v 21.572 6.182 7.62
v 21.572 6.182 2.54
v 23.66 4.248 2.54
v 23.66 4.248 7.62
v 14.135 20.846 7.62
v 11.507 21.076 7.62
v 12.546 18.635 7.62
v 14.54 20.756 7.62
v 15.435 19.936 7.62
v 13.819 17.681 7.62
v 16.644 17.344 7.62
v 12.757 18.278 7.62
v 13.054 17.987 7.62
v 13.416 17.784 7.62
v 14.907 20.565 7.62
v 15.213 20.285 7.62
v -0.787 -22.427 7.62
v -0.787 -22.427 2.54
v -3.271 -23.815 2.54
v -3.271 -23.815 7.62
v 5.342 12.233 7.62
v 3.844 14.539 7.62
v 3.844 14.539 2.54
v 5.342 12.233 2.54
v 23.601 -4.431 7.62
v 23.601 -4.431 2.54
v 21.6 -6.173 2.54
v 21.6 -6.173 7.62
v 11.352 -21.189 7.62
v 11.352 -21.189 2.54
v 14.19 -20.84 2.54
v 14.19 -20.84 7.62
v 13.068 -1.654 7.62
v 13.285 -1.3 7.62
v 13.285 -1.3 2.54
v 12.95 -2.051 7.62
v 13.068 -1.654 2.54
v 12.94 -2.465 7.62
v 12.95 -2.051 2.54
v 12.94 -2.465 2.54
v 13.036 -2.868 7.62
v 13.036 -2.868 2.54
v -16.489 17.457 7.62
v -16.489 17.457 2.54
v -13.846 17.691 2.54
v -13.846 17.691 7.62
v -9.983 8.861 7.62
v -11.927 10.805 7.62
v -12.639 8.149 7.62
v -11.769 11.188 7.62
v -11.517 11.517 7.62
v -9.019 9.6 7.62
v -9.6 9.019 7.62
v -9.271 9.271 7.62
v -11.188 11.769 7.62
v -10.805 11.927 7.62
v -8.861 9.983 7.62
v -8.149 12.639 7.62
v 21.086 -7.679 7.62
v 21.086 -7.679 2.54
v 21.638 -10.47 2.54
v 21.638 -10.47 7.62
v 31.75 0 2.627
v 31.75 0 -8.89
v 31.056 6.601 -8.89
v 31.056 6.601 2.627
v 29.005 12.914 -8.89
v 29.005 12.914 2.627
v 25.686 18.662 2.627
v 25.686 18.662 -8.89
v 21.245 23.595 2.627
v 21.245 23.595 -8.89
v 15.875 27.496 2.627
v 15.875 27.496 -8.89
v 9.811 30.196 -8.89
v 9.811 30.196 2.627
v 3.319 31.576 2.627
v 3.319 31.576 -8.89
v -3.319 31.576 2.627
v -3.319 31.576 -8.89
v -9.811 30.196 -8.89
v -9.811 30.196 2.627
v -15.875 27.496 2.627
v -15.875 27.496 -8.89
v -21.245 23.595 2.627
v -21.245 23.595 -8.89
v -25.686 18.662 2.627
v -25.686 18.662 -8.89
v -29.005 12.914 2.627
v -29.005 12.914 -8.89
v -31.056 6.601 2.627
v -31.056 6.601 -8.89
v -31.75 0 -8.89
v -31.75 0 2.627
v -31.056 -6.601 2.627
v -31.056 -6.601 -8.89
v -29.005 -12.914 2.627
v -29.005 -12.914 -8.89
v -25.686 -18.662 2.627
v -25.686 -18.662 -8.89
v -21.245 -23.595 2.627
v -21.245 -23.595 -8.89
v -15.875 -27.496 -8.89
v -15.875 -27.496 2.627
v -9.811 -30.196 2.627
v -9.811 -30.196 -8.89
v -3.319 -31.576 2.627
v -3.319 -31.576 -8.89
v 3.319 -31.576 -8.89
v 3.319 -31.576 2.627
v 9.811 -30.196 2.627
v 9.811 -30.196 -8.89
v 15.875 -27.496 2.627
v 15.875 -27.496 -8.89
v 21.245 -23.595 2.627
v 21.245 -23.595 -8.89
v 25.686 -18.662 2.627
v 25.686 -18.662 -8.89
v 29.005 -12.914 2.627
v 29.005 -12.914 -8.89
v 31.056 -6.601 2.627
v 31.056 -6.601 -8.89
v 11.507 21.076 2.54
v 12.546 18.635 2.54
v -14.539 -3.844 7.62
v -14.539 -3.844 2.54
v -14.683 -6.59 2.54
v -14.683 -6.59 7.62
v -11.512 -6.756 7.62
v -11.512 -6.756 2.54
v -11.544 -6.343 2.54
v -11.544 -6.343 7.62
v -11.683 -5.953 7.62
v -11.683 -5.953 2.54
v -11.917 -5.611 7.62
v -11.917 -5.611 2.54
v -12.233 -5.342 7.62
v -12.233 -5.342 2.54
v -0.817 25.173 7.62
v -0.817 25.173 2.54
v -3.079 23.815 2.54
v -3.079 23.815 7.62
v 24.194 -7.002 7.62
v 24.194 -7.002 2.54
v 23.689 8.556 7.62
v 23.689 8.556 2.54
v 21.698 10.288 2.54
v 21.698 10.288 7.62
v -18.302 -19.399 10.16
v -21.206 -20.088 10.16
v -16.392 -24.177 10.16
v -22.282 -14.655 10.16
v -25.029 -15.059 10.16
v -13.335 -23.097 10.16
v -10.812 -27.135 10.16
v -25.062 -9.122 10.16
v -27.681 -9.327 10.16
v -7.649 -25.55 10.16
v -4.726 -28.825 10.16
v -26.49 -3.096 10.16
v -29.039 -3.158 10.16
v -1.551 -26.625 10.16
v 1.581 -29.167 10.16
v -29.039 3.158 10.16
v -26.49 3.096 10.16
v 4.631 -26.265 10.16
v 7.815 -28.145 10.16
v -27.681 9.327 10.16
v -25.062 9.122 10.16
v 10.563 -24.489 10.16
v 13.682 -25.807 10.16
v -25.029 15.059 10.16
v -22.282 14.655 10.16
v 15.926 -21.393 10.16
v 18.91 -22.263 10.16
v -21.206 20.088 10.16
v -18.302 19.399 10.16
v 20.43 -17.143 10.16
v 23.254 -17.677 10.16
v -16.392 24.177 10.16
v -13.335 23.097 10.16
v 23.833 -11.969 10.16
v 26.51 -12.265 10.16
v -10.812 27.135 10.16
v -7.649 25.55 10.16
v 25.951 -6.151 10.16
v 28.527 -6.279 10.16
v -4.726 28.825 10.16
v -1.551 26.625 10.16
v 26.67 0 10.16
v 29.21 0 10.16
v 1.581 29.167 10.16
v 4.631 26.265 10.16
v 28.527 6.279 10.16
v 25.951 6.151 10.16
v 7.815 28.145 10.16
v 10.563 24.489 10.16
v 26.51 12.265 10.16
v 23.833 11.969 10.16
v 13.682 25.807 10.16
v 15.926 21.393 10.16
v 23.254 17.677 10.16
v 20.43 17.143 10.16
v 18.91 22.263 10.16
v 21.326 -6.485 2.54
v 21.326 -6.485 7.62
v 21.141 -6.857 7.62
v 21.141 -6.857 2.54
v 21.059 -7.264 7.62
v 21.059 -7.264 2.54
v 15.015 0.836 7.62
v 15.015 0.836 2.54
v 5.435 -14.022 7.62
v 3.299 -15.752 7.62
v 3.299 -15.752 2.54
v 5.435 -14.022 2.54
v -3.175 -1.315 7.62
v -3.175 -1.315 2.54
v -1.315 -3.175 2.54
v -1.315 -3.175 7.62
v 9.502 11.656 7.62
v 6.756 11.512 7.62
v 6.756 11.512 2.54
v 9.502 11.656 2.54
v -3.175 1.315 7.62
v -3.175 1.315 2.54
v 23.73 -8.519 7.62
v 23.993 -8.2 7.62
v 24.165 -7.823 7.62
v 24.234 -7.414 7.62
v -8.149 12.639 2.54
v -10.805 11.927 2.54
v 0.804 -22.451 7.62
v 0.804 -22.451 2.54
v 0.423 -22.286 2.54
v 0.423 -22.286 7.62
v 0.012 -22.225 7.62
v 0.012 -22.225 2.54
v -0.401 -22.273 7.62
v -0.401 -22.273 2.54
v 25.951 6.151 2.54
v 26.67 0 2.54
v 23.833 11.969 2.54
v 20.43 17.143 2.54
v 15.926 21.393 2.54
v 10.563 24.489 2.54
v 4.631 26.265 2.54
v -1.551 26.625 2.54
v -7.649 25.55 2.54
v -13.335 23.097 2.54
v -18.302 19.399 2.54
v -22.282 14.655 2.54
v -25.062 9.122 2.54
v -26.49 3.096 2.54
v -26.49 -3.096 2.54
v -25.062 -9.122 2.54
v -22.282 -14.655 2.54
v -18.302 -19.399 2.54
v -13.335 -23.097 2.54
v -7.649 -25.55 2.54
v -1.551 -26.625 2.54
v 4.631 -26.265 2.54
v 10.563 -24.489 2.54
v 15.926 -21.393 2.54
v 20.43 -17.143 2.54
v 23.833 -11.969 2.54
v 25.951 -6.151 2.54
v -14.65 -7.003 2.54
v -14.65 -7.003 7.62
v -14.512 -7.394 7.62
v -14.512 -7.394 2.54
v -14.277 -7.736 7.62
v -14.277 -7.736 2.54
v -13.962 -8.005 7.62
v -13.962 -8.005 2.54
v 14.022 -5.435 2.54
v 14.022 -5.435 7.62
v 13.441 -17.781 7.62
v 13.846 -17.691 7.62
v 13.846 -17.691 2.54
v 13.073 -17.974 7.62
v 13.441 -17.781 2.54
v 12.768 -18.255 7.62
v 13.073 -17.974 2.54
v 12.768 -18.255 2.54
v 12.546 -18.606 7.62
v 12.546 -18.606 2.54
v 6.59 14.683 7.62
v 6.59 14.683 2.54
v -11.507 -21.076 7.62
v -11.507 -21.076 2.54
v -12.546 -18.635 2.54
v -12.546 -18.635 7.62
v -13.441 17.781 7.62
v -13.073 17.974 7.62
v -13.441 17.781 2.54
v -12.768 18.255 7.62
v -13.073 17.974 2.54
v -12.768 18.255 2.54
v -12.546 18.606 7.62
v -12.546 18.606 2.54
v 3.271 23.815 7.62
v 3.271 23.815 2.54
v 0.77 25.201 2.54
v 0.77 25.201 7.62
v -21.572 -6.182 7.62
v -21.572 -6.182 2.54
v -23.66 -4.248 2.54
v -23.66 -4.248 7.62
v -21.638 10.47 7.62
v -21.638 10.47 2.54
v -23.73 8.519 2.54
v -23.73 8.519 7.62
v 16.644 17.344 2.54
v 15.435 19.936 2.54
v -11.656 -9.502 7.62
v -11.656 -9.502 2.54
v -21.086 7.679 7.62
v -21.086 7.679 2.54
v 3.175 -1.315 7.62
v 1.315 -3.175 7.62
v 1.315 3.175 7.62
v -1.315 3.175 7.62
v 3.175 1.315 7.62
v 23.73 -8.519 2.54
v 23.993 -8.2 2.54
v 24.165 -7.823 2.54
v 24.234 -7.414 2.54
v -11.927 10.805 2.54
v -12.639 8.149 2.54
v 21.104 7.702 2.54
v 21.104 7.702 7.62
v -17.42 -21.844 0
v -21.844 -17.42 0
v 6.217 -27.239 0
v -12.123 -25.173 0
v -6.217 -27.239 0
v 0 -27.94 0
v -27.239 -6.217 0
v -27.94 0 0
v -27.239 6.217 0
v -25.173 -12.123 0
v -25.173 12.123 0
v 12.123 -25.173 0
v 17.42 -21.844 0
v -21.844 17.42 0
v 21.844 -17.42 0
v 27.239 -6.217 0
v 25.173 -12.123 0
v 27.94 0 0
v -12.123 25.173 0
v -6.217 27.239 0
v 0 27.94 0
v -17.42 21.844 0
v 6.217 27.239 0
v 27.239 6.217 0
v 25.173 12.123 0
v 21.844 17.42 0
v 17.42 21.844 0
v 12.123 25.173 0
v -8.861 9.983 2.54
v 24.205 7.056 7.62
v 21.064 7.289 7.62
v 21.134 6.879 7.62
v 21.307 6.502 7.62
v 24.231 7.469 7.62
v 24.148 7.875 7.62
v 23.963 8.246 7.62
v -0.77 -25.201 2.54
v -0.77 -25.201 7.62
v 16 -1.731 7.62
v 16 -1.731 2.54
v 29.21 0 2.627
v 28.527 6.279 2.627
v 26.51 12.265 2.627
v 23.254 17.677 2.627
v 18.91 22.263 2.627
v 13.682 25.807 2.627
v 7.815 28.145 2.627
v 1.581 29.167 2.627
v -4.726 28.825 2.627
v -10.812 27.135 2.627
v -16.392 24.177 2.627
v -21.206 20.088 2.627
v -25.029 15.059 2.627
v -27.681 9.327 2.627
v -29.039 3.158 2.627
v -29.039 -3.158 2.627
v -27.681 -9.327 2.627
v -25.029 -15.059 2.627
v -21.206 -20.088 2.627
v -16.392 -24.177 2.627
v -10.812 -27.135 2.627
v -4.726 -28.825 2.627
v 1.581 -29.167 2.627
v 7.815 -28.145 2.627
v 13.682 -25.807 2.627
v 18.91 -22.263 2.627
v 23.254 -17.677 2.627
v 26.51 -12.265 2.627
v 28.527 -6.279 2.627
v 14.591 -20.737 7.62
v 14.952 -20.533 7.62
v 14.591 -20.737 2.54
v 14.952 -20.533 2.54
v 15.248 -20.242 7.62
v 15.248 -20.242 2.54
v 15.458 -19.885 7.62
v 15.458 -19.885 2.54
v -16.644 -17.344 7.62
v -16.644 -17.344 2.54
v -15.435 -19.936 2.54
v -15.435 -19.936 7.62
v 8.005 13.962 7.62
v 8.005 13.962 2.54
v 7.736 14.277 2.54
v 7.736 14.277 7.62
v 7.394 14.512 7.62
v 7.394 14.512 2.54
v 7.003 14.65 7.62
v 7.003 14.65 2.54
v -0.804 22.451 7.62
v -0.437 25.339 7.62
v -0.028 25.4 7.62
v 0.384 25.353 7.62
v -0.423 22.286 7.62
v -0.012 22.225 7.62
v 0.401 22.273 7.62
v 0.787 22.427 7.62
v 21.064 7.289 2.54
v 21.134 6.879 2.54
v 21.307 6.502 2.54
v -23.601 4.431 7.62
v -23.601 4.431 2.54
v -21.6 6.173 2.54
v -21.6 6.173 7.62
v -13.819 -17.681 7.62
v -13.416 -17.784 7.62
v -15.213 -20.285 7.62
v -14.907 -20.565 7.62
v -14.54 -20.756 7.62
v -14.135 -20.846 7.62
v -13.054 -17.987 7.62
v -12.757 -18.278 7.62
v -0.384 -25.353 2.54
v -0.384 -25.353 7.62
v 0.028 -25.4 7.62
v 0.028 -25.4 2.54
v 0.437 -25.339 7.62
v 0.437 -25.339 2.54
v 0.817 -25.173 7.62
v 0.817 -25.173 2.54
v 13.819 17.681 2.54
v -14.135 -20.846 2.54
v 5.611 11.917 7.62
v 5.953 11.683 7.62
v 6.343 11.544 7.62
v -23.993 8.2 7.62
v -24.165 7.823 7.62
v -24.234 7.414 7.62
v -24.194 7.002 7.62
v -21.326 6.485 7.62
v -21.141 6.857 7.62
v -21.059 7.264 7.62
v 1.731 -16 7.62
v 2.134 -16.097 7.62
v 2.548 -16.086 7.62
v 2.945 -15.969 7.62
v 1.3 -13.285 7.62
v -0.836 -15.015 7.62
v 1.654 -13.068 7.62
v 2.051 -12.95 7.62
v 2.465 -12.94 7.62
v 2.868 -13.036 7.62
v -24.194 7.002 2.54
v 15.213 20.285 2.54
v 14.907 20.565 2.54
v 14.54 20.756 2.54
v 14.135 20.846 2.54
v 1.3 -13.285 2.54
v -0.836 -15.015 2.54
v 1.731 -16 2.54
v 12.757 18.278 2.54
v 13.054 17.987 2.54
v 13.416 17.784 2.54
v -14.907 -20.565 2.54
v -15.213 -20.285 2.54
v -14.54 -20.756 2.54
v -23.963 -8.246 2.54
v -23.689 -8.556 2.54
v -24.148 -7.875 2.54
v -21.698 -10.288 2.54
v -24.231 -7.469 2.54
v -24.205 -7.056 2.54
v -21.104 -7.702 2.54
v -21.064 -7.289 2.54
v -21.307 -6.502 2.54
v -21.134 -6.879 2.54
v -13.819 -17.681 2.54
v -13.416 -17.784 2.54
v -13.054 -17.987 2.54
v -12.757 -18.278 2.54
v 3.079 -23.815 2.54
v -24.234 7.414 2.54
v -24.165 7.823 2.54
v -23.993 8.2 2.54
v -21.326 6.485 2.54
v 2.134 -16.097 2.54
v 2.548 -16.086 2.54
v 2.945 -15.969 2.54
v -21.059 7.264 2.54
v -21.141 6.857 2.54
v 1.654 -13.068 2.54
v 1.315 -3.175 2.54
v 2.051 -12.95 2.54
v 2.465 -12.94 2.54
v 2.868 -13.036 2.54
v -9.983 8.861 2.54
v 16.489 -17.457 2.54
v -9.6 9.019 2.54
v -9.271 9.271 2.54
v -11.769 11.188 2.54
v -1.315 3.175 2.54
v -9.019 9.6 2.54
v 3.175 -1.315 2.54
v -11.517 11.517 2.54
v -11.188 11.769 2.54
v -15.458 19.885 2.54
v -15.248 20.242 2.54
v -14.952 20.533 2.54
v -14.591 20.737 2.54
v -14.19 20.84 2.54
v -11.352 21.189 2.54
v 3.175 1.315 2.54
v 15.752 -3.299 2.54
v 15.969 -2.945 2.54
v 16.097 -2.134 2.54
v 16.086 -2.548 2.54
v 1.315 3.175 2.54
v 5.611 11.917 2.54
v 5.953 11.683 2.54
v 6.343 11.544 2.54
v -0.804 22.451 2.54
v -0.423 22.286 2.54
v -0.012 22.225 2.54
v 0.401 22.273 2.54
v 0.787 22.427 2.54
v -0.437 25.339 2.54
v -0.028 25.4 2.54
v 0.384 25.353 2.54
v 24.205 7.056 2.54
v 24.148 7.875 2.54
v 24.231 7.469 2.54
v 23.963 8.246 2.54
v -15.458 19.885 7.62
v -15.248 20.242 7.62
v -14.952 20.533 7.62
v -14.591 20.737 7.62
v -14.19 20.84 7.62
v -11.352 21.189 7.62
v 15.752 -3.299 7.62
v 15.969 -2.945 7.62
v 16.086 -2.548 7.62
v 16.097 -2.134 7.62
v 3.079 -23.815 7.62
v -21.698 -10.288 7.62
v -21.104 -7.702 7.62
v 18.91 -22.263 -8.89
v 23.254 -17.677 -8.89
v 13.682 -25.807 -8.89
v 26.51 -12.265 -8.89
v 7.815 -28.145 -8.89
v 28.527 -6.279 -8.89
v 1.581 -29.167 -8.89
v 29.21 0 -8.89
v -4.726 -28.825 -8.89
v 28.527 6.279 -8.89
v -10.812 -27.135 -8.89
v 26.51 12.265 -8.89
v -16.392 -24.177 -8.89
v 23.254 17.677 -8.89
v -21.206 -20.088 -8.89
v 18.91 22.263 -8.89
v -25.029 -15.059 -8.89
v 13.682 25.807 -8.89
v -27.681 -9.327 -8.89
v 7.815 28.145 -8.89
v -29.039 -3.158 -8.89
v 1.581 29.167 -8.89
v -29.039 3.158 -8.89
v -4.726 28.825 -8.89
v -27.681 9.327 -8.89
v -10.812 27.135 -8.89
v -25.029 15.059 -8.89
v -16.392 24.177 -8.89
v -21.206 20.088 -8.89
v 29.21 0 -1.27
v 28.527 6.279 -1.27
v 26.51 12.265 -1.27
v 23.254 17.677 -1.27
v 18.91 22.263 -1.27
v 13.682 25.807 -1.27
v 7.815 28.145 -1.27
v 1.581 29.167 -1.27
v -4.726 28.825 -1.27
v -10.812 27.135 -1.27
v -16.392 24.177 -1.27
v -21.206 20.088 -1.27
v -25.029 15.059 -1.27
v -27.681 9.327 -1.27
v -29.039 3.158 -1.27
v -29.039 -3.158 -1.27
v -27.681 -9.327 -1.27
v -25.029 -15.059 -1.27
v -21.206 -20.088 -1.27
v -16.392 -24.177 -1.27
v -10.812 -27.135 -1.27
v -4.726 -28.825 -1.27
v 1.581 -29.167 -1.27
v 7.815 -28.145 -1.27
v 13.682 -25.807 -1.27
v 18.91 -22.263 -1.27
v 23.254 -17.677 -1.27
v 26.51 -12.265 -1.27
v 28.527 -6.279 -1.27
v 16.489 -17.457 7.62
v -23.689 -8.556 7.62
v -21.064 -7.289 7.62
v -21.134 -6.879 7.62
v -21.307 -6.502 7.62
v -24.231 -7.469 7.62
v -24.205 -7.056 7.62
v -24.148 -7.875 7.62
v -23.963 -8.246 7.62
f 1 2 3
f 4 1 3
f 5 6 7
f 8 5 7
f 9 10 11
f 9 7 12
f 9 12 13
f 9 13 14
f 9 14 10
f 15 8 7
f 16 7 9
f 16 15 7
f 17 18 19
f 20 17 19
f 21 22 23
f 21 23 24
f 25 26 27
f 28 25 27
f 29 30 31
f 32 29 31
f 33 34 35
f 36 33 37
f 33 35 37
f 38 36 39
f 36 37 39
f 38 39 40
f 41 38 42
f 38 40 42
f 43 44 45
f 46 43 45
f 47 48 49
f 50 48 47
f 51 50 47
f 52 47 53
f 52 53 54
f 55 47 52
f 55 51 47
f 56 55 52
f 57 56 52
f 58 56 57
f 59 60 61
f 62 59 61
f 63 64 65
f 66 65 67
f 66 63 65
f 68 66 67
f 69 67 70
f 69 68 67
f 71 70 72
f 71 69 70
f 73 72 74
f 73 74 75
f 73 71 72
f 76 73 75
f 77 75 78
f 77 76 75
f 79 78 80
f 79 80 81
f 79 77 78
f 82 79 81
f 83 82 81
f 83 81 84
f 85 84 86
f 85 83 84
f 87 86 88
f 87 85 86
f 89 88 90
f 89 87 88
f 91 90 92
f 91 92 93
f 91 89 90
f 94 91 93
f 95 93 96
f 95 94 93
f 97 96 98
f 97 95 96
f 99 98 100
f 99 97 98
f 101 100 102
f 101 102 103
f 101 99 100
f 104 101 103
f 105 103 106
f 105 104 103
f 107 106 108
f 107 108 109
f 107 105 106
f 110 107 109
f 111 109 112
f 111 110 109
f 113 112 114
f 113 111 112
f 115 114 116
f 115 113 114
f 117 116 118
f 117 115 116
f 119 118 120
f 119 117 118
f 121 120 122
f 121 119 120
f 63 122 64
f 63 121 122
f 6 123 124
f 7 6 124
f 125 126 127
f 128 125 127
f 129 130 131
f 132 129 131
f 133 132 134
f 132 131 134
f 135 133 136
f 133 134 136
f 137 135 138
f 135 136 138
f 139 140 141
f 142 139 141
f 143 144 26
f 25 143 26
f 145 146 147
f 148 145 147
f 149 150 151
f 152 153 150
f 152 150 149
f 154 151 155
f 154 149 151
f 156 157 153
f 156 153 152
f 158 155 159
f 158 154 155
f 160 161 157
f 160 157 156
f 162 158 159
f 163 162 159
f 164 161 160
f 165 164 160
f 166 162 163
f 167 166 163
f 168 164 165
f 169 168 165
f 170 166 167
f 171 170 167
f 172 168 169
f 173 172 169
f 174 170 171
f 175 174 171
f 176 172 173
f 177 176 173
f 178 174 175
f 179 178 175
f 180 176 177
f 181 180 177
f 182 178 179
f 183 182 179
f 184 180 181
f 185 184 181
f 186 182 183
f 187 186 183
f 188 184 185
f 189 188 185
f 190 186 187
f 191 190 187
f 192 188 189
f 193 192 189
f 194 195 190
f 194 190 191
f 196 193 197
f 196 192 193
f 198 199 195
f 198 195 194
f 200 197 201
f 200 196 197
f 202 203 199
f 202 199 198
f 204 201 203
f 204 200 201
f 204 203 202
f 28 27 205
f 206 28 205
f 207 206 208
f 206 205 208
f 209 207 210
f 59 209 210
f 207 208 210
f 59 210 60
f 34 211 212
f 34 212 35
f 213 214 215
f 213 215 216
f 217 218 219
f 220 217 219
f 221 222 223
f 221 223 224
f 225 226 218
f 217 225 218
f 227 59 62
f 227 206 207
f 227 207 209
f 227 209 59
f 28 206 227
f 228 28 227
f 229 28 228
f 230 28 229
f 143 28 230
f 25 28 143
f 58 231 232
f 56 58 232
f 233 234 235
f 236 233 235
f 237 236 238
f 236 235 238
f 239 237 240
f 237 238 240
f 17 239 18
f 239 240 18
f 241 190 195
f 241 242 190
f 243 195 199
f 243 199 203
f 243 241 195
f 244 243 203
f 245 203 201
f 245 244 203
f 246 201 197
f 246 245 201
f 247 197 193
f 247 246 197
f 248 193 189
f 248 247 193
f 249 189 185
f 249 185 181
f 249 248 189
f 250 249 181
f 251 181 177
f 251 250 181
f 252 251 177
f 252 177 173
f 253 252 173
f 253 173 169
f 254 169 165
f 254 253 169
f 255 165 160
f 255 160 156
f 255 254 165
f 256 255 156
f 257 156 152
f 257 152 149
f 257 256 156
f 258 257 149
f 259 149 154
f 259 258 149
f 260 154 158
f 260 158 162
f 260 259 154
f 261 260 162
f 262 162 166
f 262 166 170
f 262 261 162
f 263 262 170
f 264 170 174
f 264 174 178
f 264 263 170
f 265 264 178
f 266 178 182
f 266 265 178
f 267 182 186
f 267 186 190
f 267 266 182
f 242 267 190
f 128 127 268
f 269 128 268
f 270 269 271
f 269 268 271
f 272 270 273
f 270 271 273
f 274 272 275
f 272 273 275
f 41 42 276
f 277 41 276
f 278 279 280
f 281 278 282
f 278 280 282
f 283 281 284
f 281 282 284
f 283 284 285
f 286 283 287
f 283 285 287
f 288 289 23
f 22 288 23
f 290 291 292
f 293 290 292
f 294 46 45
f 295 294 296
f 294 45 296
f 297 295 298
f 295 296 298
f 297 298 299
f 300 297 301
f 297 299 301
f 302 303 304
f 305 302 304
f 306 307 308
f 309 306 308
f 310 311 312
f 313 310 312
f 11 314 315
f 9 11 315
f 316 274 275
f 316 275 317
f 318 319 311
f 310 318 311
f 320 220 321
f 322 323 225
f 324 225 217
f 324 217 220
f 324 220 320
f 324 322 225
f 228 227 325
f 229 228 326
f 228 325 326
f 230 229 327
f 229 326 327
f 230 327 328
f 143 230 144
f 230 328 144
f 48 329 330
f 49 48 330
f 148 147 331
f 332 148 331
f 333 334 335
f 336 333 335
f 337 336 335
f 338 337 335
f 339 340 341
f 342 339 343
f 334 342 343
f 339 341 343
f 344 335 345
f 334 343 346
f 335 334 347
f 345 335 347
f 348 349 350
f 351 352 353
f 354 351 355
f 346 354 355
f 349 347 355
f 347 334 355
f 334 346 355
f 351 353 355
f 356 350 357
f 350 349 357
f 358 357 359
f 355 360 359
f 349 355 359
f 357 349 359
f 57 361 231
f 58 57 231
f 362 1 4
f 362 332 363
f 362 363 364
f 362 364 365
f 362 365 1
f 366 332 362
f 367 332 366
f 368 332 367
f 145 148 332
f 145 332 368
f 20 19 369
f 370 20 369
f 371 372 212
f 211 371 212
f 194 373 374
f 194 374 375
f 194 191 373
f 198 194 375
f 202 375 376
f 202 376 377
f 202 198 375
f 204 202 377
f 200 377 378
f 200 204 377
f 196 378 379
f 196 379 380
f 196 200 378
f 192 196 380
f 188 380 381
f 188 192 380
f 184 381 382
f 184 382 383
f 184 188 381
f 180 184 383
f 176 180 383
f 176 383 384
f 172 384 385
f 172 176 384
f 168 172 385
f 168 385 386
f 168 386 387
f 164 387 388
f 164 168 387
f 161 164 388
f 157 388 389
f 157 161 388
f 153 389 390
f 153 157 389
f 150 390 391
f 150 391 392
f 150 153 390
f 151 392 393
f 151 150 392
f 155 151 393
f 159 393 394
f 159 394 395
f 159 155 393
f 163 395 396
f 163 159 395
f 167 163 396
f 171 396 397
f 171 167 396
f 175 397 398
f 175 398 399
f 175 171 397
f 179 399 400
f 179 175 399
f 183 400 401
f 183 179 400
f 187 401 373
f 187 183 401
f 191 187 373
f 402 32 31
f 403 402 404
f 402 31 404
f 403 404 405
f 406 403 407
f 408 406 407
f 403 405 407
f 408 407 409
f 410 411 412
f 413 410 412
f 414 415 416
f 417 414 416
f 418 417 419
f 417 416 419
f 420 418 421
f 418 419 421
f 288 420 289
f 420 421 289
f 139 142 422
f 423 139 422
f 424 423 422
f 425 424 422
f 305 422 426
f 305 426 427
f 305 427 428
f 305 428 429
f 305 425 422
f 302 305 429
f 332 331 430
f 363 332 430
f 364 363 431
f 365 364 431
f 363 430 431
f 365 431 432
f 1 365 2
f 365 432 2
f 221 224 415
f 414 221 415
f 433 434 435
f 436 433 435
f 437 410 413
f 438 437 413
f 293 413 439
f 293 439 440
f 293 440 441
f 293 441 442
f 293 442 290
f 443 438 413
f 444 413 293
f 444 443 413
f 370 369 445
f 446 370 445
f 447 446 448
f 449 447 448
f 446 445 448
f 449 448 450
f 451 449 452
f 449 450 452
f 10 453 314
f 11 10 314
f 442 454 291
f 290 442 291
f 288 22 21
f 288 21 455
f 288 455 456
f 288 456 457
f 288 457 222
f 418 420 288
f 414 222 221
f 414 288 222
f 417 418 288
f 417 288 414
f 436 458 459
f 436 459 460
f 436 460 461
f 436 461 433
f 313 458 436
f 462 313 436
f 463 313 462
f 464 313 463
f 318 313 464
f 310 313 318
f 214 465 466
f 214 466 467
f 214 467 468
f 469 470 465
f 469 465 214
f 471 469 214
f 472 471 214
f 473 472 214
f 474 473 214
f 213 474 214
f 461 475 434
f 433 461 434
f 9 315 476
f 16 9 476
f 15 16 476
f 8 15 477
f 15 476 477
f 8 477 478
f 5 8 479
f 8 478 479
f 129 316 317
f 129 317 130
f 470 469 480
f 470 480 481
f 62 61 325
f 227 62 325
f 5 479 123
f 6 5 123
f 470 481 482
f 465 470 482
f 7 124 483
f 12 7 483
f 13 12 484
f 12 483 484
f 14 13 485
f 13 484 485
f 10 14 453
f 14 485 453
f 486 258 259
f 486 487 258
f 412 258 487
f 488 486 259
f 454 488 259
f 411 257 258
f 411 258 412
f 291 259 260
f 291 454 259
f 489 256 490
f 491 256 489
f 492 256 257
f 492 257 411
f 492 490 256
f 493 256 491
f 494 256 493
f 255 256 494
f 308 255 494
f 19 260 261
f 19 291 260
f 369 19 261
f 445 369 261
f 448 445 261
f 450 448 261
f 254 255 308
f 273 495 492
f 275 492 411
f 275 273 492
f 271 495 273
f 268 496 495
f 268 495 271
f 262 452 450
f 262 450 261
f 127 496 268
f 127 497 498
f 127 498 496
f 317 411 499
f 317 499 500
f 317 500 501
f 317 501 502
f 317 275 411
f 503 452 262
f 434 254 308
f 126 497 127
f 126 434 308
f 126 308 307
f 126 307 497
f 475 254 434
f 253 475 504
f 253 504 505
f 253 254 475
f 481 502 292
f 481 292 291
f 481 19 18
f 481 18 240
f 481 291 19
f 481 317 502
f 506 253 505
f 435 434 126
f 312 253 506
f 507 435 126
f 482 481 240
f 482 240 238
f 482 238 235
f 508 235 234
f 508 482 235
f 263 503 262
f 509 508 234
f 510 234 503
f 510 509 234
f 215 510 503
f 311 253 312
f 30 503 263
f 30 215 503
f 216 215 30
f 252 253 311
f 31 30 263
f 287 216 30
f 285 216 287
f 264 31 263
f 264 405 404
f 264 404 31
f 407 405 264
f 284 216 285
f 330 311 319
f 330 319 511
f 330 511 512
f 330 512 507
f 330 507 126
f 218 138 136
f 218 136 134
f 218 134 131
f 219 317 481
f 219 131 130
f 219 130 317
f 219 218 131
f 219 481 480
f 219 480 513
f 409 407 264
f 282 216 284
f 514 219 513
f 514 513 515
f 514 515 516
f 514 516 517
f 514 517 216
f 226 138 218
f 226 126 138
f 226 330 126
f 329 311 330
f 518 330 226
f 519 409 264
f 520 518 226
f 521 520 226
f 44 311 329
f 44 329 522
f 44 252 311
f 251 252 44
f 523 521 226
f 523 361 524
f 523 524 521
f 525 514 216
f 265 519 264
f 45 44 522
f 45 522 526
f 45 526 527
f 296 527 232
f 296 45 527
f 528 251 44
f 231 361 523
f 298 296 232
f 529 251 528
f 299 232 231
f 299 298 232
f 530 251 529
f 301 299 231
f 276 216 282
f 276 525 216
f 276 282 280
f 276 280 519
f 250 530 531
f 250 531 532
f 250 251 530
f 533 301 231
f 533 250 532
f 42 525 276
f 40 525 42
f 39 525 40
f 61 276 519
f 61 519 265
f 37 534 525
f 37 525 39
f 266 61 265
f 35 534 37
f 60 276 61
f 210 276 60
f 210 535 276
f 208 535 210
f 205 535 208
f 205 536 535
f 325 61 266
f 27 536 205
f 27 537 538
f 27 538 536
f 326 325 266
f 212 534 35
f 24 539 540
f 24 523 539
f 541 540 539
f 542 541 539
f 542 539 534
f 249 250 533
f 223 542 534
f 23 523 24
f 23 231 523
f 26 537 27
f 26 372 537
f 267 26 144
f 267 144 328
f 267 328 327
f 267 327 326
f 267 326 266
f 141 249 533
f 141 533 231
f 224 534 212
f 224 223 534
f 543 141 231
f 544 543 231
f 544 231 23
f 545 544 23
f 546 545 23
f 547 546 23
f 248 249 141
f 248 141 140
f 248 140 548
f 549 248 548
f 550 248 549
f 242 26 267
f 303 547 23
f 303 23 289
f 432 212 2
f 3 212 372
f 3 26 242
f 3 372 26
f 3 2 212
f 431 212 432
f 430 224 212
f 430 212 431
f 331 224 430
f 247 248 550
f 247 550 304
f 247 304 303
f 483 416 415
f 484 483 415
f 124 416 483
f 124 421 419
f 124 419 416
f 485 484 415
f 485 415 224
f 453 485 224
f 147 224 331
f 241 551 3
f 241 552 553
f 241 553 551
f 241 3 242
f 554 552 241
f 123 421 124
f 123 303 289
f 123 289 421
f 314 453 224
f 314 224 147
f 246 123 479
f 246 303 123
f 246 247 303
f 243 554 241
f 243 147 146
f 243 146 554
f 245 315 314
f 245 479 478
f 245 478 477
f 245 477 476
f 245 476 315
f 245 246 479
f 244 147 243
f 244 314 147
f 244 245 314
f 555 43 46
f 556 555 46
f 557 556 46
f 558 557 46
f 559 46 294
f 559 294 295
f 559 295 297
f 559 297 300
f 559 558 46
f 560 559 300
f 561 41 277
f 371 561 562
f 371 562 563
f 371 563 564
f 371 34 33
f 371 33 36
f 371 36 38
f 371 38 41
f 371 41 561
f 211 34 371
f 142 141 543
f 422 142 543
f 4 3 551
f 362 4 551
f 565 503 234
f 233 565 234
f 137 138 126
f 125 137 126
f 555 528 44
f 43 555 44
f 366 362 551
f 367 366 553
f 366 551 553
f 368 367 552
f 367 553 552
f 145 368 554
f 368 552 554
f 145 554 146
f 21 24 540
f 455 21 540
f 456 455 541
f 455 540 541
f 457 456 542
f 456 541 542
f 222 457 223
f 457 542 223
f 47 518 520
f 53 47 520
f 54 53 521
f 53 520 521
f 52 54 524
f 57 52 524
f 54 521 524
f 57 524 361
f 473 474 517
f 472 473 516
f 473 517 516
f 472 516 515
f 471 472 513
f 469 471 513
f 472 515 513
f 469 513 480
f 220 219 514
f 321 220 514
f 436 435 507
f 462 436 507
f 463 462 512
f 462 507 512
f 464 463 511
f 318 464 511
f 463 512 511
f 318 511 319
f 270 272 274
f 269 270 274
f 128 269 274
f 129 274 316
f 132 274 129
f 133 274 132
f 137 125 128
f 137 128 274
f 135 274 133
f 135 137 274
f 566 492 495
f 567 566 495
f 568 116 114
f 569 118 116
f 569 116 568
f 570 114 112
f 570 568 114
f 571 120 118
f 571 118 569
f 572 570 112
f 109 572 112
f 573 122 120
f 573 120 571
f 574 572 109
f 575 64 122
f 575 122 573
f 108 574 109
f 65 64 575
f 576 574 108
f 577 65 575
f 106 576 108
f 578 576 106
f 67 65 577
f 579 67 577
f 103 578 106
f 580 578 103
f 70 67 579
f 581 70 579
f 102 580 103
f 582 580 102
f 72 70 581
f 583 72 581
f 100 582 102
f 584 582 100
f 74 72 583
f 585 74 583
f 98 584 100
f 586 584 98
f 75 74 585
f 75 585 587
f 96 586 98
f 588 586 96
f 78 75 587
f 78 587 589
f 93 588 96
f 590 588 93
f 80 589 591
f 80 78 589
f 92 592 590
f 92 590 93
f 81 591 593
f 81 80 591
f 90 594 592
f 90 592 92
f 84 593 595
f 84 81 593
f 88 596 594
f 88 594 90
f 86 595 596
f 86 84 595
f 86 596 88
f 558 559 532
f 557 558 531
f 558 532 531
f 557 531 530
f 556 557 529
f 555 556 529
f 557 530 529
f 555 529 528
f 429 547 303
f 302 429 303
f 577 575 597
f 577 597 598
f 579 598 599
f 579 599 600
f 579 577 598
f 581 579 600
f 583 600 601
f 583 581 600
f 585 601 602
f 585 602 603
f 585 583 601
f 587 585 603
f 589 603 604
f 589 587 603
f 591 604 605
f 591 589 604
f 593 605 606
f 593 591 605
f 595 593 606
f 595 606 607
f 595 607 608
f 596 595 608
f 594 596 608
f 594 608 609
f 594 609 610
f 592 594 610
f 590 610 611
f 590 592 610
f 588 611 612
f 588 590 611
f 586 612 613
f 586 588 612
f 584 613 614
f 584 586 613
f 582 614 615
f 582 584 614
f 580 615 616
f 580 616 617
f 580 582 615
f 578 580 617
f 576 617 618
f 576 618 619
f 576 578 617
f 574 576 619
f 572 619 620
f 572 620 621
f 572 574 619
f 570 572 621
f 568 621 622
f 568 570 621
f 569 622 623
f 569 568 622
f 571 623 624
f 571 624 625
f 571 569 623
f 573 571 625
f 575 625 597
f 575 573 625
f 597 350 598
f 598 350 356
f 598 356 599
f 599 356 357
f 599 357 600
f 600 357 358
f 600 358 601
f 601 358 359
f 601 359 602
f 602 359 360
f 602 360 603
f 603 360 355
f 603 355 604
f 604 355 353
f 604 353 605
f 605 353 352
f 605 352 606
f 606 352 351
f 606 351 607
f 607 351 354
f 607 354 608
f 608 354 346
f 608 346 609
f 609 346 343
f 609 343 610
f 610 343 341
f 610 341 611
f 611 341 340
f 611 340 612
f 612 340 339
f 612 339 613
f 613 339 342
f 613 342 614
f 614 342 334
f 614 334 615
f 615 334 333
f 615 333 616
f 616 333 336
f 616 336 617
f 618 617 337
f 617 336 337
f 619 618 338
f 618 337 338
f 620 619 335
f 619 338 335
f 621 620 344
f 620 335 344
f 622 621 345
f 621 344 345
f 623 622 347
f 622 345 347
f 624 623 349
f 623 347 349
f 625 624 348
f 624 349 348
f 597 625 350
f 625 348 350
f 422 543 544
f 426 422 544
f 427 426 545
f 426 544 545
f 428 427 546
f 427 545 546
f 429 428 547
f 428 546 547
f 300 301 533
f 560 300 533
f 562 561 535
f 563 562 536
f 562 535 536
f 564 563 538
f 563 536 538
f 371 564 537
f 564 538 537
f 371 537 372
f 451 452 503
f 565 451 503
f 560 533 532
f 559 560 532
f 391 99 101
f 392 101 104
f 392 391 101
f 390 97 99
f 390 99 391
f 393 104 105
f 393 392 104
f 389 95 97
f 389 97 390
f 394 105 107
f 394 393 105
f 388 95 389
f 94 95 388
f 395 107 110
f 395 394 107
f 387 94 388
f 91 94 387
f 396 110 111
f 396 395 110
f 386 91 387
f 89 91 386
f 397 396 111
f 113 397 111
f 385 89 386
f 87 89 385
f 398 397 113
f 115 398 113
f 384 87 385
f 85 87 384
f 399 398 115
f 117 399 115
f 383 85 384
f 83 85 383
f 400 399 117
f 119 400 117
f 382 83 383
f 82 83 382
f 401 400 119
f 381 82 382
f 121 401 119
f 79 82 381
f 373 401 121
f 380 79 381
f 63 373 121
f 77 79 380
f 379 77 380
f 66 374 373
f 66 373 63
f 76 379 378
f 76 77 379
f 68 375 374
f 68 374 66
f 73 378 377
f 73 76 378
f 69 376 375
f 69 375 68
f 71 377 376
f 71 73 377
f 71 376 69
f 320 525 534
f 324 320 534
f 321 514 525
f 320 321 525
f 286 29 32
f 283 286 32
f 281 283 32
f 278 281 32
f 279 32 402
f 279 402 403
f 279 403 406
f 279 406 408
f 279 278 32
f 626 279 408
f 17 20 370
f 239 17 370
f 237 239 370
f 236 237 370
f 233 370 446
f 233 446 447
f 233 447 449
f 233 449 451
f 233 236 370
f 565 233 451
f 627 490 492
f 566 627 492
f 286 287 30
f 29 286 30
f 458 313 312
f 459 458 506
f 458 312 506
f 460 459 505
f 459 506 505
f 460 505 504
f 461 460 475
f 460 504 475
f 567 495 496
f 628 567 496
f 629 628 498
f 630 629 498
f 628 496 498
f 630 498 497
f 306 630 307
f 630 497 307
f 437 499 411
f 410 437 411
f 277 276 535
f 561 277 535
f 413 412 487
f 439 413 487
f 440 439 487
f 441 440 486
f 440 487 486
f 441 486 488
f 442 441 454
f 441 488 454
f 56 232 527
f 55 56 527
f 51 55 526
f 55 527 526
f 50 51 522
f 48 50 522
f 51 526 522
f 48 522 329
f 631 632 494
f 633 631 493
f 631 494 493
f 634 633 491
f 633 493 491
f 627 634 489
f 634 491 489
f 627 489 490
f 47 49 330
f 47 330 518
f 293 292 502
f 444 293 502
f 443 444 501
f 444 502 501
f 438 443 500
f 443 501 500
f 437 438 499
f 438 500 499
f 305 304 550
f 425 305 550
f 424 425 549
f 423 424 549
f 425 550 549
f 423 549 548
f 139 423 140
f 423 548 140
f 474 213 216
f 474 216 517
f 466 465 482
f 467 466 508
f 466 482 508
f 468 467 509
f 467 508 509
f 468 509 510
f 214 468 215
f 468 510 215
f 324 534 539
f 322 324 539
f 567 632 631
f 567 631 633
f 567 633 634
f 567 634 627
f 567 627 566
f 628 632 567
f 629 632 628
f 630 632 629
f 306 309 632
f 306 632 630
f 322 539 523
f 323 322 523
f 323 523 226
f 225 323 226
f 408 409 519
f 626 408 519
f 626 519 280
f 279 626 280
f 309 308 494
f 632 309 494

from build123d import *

# Parameters (mm, degrees)
F3_DEPTH = 7.62
F4_DEPTH = 7.62
F5_SIZE2 = 1.27
F5_SIZE  = 1.27


with BuildPart() as f1:
    # F0 (on Front) → F1 (revolve)
    with BuildSketch(Plane.XZ):
        Polygon((0, 2.54), (0, 0), (29.21, 0), (29.21, -8.89), (31.75, -8.89), (31.75, 2.627364982), (29.21, 2.627364982), (29.21, 10.16), (26.67, 10.16), (26.67, 2.54), align=None)
    revolve(axis=Axis((0, 0, 16.0585250768), (0, 0, 1)))

    # F2 (on Top) → F3 (join)
    with BuildSketch(Plane.XY):
        Polygon((1.3151280605, 3.175), (-1.3151280605, 3.175), (-3.175, 1.3151280605), (-3.175, -1.3151280605), (-1.3151280605, -3.175), (1.3151280605, -3.175), (3.175, -1.3151280605), (3.175, 1.3151280605), align=None)
        with BuildLine():
            ThreePointArc((0.7695885521, 25.2009846814), (-0.0276534791, 25.3997591266), (-0.817487623, 25.1733343897))
            Line((-0.817487623, 25.1733343897), (-3.0792138768, 23.8146582472))
            Line((-3.0792138768, 23.8146582472), (-0.8036357163, 22.4508293919))
            ThreePointArc((-0.8036357163, 22.4508293919), (-0.0116477599, 22.2251830345), (0.786827008, 22.426675582))
            Line((0.786827008, 22.426675582), (3.2707861232, 23.8146582472))
            Line((3.2707861232, 23.8146582472), (0.7695885521, 25.2009846814))
        make_face()
        with BuildLine():
            Line((-12.5455127439, 18.6060469845), (-11.3517833474, 21.1889830838))
            Line((-11.3517833474, 21.1889830838), (-14.1901569216, 20.8403776835))
            ThreePointArc((-14.1901569216, 20.8403776835), (-14.951975961, 20.5325824793), (-15.457876085, 19.8851481576))
            Line((-15.457876085, 19.8851481576), (-16.4890412617, 17.4565467318))
            Line((-16.4890412617, 17.4565467318), (-13.8464213701, 17.6907372936))
            ThreePointArc((-13.8464213701, 17.6907372936), (-13.0730580529, 17.9737043965), (-12.5455127439, 18.6060469845))
        make_face()
        with BuildLine():
            Line((-21.085893034, 7.6785408353), (-21.6383574123, 10.4698365695))
            Line((-21.6383574123, 10.4698365695), (-23.729744757, 8.5194547489))
            ThreePointArc((-23.729744757, 8.5194547489), (-24.1651518247, 7.8226572017), (-24.1938812764, 7.0015112006))
            Line((-24.1938812764, 7.0015112006), (-23.6006153266, 4.430627691))
            Line((-23.6006153266, 4.430627691), (-21.600344683, 6.1733848352))
            ThreePointArc((-21.600344683, 6.1733848352), (-21.1410045066, 6.8568815828), (-21.085893034, 7.6785408353))
        make_face()
        with BuildLine():
            Line((-21.5721788682, -6.181906929), (-23.6598144064, -4.2484316577))
            Line((-23.6598144064, -4.2484316577), (-24.2053766396, -7.0556103342))
            ThreePointArc((-24.2053766396, -7.0556103342), (-24.1480610347, -7.8752572447), (-23.68864614, -8.5564650624))
            Line((-23.68864614, -8.5564650624), (-21.6975564921, -10.2876405362))
            Line((-21.6975564921, -10.2876405362), (-21.1036704958, -7.7019908046))
            ThreePointArc((-21.1036704958, -7.7019908046), (-21.133805795, -6.8790369387), (-21.5721788682, -6.181906929))
        make_face()
        with BuildLine():
            Line((-13.8186255861, -17.6810763618), (-16.6440264647, -17.3439433906))
            Line((-16.6440264647, -17.3439433906), (-15.4353773563, -19.935672081))
            ThreePointArc((-15.4353773563, -19.935672081), (-14.9072316919, -20.5650910937), (-14.1351533255, -20.8461624951))
            Line((-14.1351533255, -20.8461624951), (-11.5067685504, -21.0763797426))
            Line((-11.5067685504, -21.0763797426), (-12.5461114665, -18.6354677381))
            ThreePointArc((-12.5461114665, -18.6354677381), (-13.0542115814, -17.9873971595), (-13.8186255861, -17.6810763618))
        make_face()
        with BuildLine():
            Line((-0.786827008, -22.426675582), (-3.2707861232, -23.8146582472))
            Line((-3.2707861232, -23.8146582472), (-0.7695885521, -25.2009846814))
            ThreePointArc((-0.7695885521, -25.2009846814), (0.0276534791, -25.3997591266), (0.817487623, -25.1733343897))
            Line((0.817487623, -25.1733343897), (3.0792138768, -23.8146582472))
            Line((3.0792138768, -23.8146582472), (0.8036357163, -22.4508293919))
            ThreePointArc((0.8036357163, -22.4508293919), (0.0116477599, -22.2251830345), (-0.786827008, -22.426675582))
        make_face()
        with BuildLine():
            Line((12.5455127439, -18.6060469845), (11.3517833474, -21.1889830838))
            Line((11.3517833474, -21.1889830838), (14.1901569216, -20.8403776835))
            ThreePointArc((14.1901569216, -20.8403776835), (14.951975961, -20.5325824793), (15.457876085, -19.8851481576))
            Line((15.457876085, -19.8851481576), (16.4890412617, -17.4565467318))
            Line((16.4890412617, -17.4565467318), (13.8464213701, -17.6907372936))
            ThreePointArc((13.8464213701, -17.6907372936), (13.0730580529, -17.9737043965), (12.5455127439, -18.6060469845))
        make_face()
        with BuildLine():
            Line((21.085893034, -7.6785408353), (21.6383574123, -10.4698365695))
            Line((21.6383574123, -10.4698365695), (23.729744757, -8.5194547489))
            ThreePointArc((23.729744757, -8.5194547489), (24.1651518247, -7.8226572017), (24.1938812764, -7.0015112006))
            Line((24.1938812764, -7.0015112006), (23.6006153266, -4.430627691))
            Line((23.6006153266, -4.430627691), (21.600344683, -6.1733848352))
            ThreePointArc((21.600344683, -6.1733848352), (21.1410045066, -6.8568815828), (21.085893034, -7.6785408353))
        make_face()
        with BuildLine():
            Line((21.5721788682, 6.181906929), (23.6598144064, 4.2484316577))
            Line((23.6598144064, 4.2484316577), (24.2053766396, 7.0556103342))
            ThreePointArc((24.2053766396, 7.0556103342), (24.1480610347, 7.8752572447), (23.68864614, 8.5564650624))
            Line((23.68864614, 8.5564650624), (21.6975564921, 10.2876405362))
            Line((21.6975564921, 10.2876405362), (21.1036704958, 7.7019908046))
            ThreePointArc((21.1036704958, 7.7019908046), (21.133805795, 6.8790369387), (21.5721788682, 6.181906929))
        make_face()
        with BuildLine():
            Line((13.8186255861, 17.6810763618), (16.6440264647, 17.3439433906))
            Line((16.6440264647, 17.3439433906), (15.4353773563, 19.935672081))
            ThreePointArc((15.4353773563, 19.935672081), (14.9072316919, 20.5650910937), (14.1351533255, 20.8461624951))
            Line((14.1351533255, 20.8461624951), (11.5067685504, 21.0763797426))
            Line((11.5067685504, 21.0763797426), (12.5461114665, 18.6354677381))
            ThreePointArc((12.5461114665, 18.6354677381), (13.0542115814, 17.9873971595), (13.8186255861, 17.6810763618))
        make_face()
        with BuildLine():
            Line((-11.927435173, 10.8049031515), (-12.6390919528, 8.1489638888))
            Line((-12.6390919565, 8.1489638901), (-9.9831526938, 8.8606206699))
            ThreePointArc((-9.9831526938, 8.8606206699), (-9.2714959087, 9.2714959076), (-8.8606206755, 9.9831526953))
            Line((-8.8606206699, 9.9831526938), (-8.1489638914, 12.6390919517))
            Line((-8.1489638944, 12.6390919548), (-10.8049031524, 11.9274351763))
            ThreePointArc((-10.8049031511, 11.9274351713), (-11.516559939, 11.5165599379), (-11.9274351769, 10.8049031526))
        make_face()
        with BuildLine():
            Line((-12.2326247903, -5.3419871867), (-14.5386590897, -3.8444310034))
            Line((-14.5386590936, -3.8444310054), (-14.6825636438, -6.5902933823))
            ThreePointArc((-14.6825636386, -6.5902933825), (-14.5117121122, -7.3940866377), (-13.9618537201, -8.0047662509))
            Line((-13.961853718, -8.0047662476), (-11.6558194144, -9.5023224336))
            Line((-11.6558194167, -9.5023224367), (-11.5119148663, -6.7564600549))
            ThreePointArc((-11.5119148663, -6.7564600549), (-11.6827663979, -5.9526668011), (-12.2326247934, -5.3419871916))
        make_face()
        with BuildLine():
            Line((1.3004427779, -13.2846823426), (-0.8364215769, -15.0150809792))
            Line((-0.8364215762, -15.0150809835), (1.7305797786, -16.0004604823))
            ThreePointArc((1.7305797804, -16.0004604775), (2.5478286188, -16.0863567958), (3.2985350319, -15.7521207676))
            Line((3.2985350294, -15.7521207646), (5.435399388, -14.0217221248))
            Line((5.4353993902, -14.021722128), (2.8683980308, -13.0363426274))
            ThreePointArc((2.8683980308, -13.0363426274), (2.0511491922, -12.9504463144), (1.3004427815, -13.2846823471))
        make_face()
        with BuildLine():
            Line((13.0363426274, -2.8683980308), (14.0217221262, -5.4353993856))
            Line((14.0217221306, -5.4353993863), (15.7521207672, -3.2985350315))
            ThreePointArc((15.7521207631, -3.2985350282), (16.0863567961, -2.5478286172), (16.0004604829, -1.7305797784))
            Line((16.0004604792, -1.7305797798), (15.0150809786, 0.8364215797))
            Line((15.0150809823, 0.8364215808), (13.2846823426, -1.3004427779))
            ThreePointArc((13.2846823426, -1.3004427779), (12.9504463147, -2.0511491907), (13.0363426328, -2.8683980287))
        make_face()
        with BuildLine():
            Line((6.7564600549, 11.5119148663), (9.5023224318, 11.6558194165))
            Line((9.5023224337, 11.6558194204), (8.0047662504, 13.9618537198))
            ThreePointArc((8.0047662461, 13.961853717), (7.3940866364, 14.5117121129), (6.5902933822, 14.6825636444))
            Line((6.5902933824, 14.6825636404), (3.8444310006, 14.53865909))
            Line((3.8444310007, 14.5386590939), (5.3419871867, 12.2326247903))
            ThreePointArc((5.3419871867, 12.2326247903), (5.9526667997, 11.6827663986), (6.7564600546, 11.5119148721))
        make_face()
    extrude(amount=F3_DEPTH)

    # F2 (on Top) → F4 (join)
    with BuildSketch(Plane.XY):
        Polygon((1.3151280605, 3.175), (-1.3151280605, 3.175), (-3.175, 1.3151280605), (-3.175, -1.3151280605), (-1.3151280605, -3.175), (1.3151280605, -3.175), (3.175, -1.3151280605), (3.175, 1.3151280605), align=None)
        with BuildLine():
            ThreePointArc((0.7695885521, 25.2009846814), (-0.0276534791, 25.3997591266), (-0.817487623, 25.1733343897))
            Line((-0.817487623, 25.1733343897), (-3.0792138768, 23.8146582472))
            Line((-3.0792138768, 23.8146582472), (-0.8036357163, 22.4508293919))
            ThreePointArc((-0.8036357163, 22.4508293919), (-0.0116477599, 22.2251830345), (0.786827008, 22.426675582))
            Line((0.786827008, 22.426675582), (3.2707861232, 23.8146582472))
            Line((3.2707861232, 23.8146582472), (0.7695885521, 25.2009846814))
        make_face()
        with BuildLine():
            Line((-12.5455127439, 18.6060469845), (-11.3517833474, 21.1889830838))
            Line((-11.3517833474, 21.1889830838), (-14.1901569216, 20.8403776835))
            ThreePointArc((-14.1901569216, 20.8403776835), (-14.951975961, 20.5325824793), (-15.457876085, 19.8851481576))
            Line((-15.457876085, 19.8851481576), (-16.4890412617, 17.4565467318))
            Line((-16.4890412617, 17.4565467318), (-13.8464213701, 17.6907372936))
            ThreePointArc((-13.8464213701, 17.6907372936), (-13.0730580529, 17.9737043965), (-12.5455127439, 18.6060469845))
        make_face()
        with BuildLine():
            Line((-21.085893034, 7.6785408353), (-21.6383574123, 10.4698365695))
            Line((-21.6383574123, 10.4698365695), (-23.729744757, 8.5194547489))
            ThreePointArc((-23.729744757, 8.5194547489), (-24.1651518247, 7.8226572017), (-24.1938812764, 7.0015112006))
            Line((-24.1938812764, 7.0015112006), (-23.6006153266, 4.430627691))
            Line((-23.6006153266, 4.430627691), (-21.600344683, 6.1733848352))
            ThreePointArc((-21.600344683, 6.1733848352), (-21.1410045066, 6.8568815828), (-21.085893034, 7.6785408353))
        make_face()
        with BuildLine():
            Line((-21.5721788682, -6.181906929), (-23.6598144064, -4.2484316577))
            Line((-23.6598144064, -4.2484316577), (-24.2053766396, -7.0556103342))
            ThreePointArc((-24.2053766396, -7.0556103342), (-24.1480610347, -7.8752572447), (-23.68864614, -8.5564650624))
            Line((-23.68864614, -8.5564650624), (-21.6975564921, -10.2876405362))
            Line((-21.6975564921, -10.2876405362), (-21.1036704958, -7.7019908046))
            ThreePointArc((-21.1036704958, -7.7019908046), (-21.133805795, -6.8790369387), (-21.5721788682, -6.181906929))
        make_face()
        with BuildLine():
            Line((-13.8186255861, -17.6810763618), (-16.6440264647, -17.3439433906))
            Line((-16.6440264647, -17.3439433906), (-15.4353773563, -19.935672081))
            ThreePointArc((-15.4353773563, -19.935672081), (-14.9072316919, -20.5650910937), (-14.1351533255, -20.8461624951))
            Line((-14.1351533255, -20.8461624951), (-11.5067685504, -21.0763797426))
            Line((-11.5067685504, -21.0763797426), (-12.5461114665, -18.6354677381))
            ThreePointArc((-12.5461114665, -18.6354677381), (-13.0542115814, -17.9873971595), (-13.8186255861, -17.6810763618))
        make_face()
        with BuildLine():
            Line((-0.786827008, -22.426675582), (-3.2707861232, -23.8146582472))
            Line((-3.2707861232, -23.8146582472), (-0.7695885521, -25.2009846814))
            ThreePointArc((-0.7695885521, -25.2009846814), (0.0276534791, -25.3997591266), (0.817487623, -25.1733343897))
            Line((0.817487623, -25.1733343897), (3.0792138768, -23.8146582472))
            Line((3.0792138768, -23.8146582472), (0.8036357163, -22.4508293919))
            ThreePointArc((0.8036357163, -22.4508293919), (0.0116477599, -22.2251830345), (-0.786827008, -22.426675582))
        make_face()
        with BuildLine():
            Line((12.5455127439, -18.6060469845), (11.3517833474, -21.1889830838))
            Line((11.3517833474, -21.1889830838), (14.1901569216, -20.8403776835))
            ThreePointArc((14.1901569216, -20.8403776835), (14.951975961, -20.5325824793), (15.457876085, -19.8851481576))
            Line((15.457876085, -19.8851481576), (16.4890412617, -17.4565467318))
            Line((16.4890412617, -17.4565467318), (13.8464213701, -17.6907372936))
            ThreePointArc((13.8464213701, -17.6907372936), (13.0730580529, -17.9737043965), (12.5455127439, -18.6060469845))
        make_face()
        with BuildLine():
            Line((21.085893034, -7.6785408353), (21.6383574123, -10.4698365695))
            Line((21.6383574123, -10.4698365695), (23.729744757, -8.5194547489))
            ThreePointArc((23.729744757, -8.5194547489), (24.1651518247, -7.8226572017), (24.1938812764, -7.0015112006))
            Line((24.1938812764, -7.0015112006), (23.6006153266, -4.430627691))
            Line((23.6006153266, -4.430627691), (21.600344683, -6.1733848352))
            ThreePointArc((21.600344683, -6.1733848352), (21.1410045066, -6.8568815828), (21.085893034, -7.6785408353))
        make_face()
        with BuildLine():
            Line((21.5721788682, 6.181906929), (23.6598144064, 4.2484316577))
            Line((23.6598144064, 4.2484316577), (24.2053766396, 7.0556103342))
            ThreePointArc((24.2053766396, 7.0556103342), (24.1480610347, 7.8752572447), (23.68864614, 8.5564650624))
            Line((23.68864614, 8.5564650624), (21.6975564921, 10.2876405362))
            Line((21.6975564921, 10.2876405362), (21.1036704958, 7.7019908046))
            ThreePointArc((21.1036704958, 7.7019908046), (21.133805795, 6.8790369387), (21.5721788682, 6.181906929))
        make_face()
        with BuildLine():
            Line((13.8186255861, 17.6810763618), (16.6440264647, 17.3439433906))
            Line((16.6440264647, 17.3439433906), (15.4353773563, 19.935672081))
            ThreePointArc((15.4353773563, 19.935672081), (14.9072316919, 20.5650910937), (14.1351533255, 20.8461624951))
            Line((14.1351533255, 20.8461624951), (11.5067685504, 21.0763797426))
            Line((11.5067685504, 21.0763797426), (12.5461114665, 18.6354677381))
            ThreePointArc((12.5461114665, 18.6354677381), (13.0542115814, 17.9873971595), (13.8186255861, 17.6810763618))
        make_face()
        with BuildLine():
            Line((-11.927435173, 10.8049031515), (-12.6390919528, 8.1489638888))
            Line((-12.6390919565, 8.1489638901), (-9.9831526938, 8.8606206699))
            ThreePointArc((-9.9831526938, 8.8606206699), (-9.2714959087, 9.2714959076), (-8.8606206755, 9.9831526953))
            Line((-8.8606206699, 9.9831526938), (-8.1489638914, 12.6390919517))
            Line((-8.1489638944, 12.6390919548), (-10.8049031524, 11.9274351763))
            ThreePointArc((-10.8049031511, 11.9274351713), (-11.516559939, 11.5165599379), (-11.9274351769, 10.8049031526))
        make_face()
        with BuildLine():
            Line((-12.2326247903, -5.3419871867), (-14.5386590897, -3.8444310034))
            Line((-14.5386590936, -3.8444310054), (-14.6825636438, -6.5902933823))
            ThreePointArc((-14.6825636386, -6.5902933825), (-14.5117121122, -7.3940866377), (-13.9618537201, -8.0047662509))
            Line((-13.961853718, -8.0047662476), (-11.6558194144, -9.5023224336))
            Line((-11.6558194167, -9.5023224367), (-11.5119148663, -6.7564600549))
            ThreePointArc((-11.5119148663, -6.7564600549), (-11.6827663979, -5.9526668011), (-12.2326247934, -5.3419871916))
        make_face()
        with BuildLine():
            Line((1.3004427779, -13.2846823426), (-0.8364215769, -15.0150809792))
            Line((-0.8364215762, -15.0150809835), (1.7305797786, -16.0004604823))
            ThreePointArc((1.7305797804, -16.0004604775), (2.5478286188, -16.0863567958), (3.2985350319, -15.7521207676))
            Line((3.2985350294, -15.7521207646), (5.435399388, -14.0217221248))
            Line((5.4353993902, -14.021722128), (2.8683980308, -13.0363426274))
            ThreePointArc((2.8683980308, -13.0363426274), (2.0511491922, -12.9504463144), (1.3004427815, -13.2846823471))
        make_face()
        with BuildLine():
            Line((13.0363426274, -2.8683980308), (14.0217221262, -5.4353993856))
            Line((14.0217221306, -5.4353993863), (15.7521207672, -3.2985350315))
            ThreePointArc((15.7521207631, -3.2985350282), (16.0863567961, -2.5478286172), (16.0004604829, -1.7305797784))
            Line((16.0004604792, -1.7305797798), (15.0150809786, 0.8364215797))
            Line((15.0150809823, 0.8364215808), (13.2846823426, -1.3004427779))
            ThreePointArc((13.2846823426, -1.3004427779), (12.9504463147, -2.0511491907), (13.0363426328, -2.8683980287))
        make_face()
        with BuildLine():
            Line((6.7564600549, 11.5119148663), (9.5023224318, 11.6558194165))
            Line((9.5023224337, 11.6558194204), (8.0047662504, 13.9618537198))
            ThreePointArc((8.0047662461, 13.961853717), (7.3940866364, 14.5117121129), (6.5902933822, 14.6825636444))
            Line((6.5902933824, 14.6825636404), (3.8444310006, 14.53865909))
            Line((3.8444310007, 14.5386590939), (5.3419871867, 12.2326247903))
            ThreePointArc((5.3419871867, 12.2326247903), (5.9526667997, 11.6827663986), (6.7564600546, 11.5119148721))
        make_face()
    extrude(amount=F4_DEPTH)

    # F5
    f5_edges = [f1.edges().sort_by_distance(p)[0] for p in [
        (-29.21, 0, 0),
    ]]
    chamfer(f5_edges, length=F5_SIZE, length2=F5_SIZE2)


solid = f1.part
